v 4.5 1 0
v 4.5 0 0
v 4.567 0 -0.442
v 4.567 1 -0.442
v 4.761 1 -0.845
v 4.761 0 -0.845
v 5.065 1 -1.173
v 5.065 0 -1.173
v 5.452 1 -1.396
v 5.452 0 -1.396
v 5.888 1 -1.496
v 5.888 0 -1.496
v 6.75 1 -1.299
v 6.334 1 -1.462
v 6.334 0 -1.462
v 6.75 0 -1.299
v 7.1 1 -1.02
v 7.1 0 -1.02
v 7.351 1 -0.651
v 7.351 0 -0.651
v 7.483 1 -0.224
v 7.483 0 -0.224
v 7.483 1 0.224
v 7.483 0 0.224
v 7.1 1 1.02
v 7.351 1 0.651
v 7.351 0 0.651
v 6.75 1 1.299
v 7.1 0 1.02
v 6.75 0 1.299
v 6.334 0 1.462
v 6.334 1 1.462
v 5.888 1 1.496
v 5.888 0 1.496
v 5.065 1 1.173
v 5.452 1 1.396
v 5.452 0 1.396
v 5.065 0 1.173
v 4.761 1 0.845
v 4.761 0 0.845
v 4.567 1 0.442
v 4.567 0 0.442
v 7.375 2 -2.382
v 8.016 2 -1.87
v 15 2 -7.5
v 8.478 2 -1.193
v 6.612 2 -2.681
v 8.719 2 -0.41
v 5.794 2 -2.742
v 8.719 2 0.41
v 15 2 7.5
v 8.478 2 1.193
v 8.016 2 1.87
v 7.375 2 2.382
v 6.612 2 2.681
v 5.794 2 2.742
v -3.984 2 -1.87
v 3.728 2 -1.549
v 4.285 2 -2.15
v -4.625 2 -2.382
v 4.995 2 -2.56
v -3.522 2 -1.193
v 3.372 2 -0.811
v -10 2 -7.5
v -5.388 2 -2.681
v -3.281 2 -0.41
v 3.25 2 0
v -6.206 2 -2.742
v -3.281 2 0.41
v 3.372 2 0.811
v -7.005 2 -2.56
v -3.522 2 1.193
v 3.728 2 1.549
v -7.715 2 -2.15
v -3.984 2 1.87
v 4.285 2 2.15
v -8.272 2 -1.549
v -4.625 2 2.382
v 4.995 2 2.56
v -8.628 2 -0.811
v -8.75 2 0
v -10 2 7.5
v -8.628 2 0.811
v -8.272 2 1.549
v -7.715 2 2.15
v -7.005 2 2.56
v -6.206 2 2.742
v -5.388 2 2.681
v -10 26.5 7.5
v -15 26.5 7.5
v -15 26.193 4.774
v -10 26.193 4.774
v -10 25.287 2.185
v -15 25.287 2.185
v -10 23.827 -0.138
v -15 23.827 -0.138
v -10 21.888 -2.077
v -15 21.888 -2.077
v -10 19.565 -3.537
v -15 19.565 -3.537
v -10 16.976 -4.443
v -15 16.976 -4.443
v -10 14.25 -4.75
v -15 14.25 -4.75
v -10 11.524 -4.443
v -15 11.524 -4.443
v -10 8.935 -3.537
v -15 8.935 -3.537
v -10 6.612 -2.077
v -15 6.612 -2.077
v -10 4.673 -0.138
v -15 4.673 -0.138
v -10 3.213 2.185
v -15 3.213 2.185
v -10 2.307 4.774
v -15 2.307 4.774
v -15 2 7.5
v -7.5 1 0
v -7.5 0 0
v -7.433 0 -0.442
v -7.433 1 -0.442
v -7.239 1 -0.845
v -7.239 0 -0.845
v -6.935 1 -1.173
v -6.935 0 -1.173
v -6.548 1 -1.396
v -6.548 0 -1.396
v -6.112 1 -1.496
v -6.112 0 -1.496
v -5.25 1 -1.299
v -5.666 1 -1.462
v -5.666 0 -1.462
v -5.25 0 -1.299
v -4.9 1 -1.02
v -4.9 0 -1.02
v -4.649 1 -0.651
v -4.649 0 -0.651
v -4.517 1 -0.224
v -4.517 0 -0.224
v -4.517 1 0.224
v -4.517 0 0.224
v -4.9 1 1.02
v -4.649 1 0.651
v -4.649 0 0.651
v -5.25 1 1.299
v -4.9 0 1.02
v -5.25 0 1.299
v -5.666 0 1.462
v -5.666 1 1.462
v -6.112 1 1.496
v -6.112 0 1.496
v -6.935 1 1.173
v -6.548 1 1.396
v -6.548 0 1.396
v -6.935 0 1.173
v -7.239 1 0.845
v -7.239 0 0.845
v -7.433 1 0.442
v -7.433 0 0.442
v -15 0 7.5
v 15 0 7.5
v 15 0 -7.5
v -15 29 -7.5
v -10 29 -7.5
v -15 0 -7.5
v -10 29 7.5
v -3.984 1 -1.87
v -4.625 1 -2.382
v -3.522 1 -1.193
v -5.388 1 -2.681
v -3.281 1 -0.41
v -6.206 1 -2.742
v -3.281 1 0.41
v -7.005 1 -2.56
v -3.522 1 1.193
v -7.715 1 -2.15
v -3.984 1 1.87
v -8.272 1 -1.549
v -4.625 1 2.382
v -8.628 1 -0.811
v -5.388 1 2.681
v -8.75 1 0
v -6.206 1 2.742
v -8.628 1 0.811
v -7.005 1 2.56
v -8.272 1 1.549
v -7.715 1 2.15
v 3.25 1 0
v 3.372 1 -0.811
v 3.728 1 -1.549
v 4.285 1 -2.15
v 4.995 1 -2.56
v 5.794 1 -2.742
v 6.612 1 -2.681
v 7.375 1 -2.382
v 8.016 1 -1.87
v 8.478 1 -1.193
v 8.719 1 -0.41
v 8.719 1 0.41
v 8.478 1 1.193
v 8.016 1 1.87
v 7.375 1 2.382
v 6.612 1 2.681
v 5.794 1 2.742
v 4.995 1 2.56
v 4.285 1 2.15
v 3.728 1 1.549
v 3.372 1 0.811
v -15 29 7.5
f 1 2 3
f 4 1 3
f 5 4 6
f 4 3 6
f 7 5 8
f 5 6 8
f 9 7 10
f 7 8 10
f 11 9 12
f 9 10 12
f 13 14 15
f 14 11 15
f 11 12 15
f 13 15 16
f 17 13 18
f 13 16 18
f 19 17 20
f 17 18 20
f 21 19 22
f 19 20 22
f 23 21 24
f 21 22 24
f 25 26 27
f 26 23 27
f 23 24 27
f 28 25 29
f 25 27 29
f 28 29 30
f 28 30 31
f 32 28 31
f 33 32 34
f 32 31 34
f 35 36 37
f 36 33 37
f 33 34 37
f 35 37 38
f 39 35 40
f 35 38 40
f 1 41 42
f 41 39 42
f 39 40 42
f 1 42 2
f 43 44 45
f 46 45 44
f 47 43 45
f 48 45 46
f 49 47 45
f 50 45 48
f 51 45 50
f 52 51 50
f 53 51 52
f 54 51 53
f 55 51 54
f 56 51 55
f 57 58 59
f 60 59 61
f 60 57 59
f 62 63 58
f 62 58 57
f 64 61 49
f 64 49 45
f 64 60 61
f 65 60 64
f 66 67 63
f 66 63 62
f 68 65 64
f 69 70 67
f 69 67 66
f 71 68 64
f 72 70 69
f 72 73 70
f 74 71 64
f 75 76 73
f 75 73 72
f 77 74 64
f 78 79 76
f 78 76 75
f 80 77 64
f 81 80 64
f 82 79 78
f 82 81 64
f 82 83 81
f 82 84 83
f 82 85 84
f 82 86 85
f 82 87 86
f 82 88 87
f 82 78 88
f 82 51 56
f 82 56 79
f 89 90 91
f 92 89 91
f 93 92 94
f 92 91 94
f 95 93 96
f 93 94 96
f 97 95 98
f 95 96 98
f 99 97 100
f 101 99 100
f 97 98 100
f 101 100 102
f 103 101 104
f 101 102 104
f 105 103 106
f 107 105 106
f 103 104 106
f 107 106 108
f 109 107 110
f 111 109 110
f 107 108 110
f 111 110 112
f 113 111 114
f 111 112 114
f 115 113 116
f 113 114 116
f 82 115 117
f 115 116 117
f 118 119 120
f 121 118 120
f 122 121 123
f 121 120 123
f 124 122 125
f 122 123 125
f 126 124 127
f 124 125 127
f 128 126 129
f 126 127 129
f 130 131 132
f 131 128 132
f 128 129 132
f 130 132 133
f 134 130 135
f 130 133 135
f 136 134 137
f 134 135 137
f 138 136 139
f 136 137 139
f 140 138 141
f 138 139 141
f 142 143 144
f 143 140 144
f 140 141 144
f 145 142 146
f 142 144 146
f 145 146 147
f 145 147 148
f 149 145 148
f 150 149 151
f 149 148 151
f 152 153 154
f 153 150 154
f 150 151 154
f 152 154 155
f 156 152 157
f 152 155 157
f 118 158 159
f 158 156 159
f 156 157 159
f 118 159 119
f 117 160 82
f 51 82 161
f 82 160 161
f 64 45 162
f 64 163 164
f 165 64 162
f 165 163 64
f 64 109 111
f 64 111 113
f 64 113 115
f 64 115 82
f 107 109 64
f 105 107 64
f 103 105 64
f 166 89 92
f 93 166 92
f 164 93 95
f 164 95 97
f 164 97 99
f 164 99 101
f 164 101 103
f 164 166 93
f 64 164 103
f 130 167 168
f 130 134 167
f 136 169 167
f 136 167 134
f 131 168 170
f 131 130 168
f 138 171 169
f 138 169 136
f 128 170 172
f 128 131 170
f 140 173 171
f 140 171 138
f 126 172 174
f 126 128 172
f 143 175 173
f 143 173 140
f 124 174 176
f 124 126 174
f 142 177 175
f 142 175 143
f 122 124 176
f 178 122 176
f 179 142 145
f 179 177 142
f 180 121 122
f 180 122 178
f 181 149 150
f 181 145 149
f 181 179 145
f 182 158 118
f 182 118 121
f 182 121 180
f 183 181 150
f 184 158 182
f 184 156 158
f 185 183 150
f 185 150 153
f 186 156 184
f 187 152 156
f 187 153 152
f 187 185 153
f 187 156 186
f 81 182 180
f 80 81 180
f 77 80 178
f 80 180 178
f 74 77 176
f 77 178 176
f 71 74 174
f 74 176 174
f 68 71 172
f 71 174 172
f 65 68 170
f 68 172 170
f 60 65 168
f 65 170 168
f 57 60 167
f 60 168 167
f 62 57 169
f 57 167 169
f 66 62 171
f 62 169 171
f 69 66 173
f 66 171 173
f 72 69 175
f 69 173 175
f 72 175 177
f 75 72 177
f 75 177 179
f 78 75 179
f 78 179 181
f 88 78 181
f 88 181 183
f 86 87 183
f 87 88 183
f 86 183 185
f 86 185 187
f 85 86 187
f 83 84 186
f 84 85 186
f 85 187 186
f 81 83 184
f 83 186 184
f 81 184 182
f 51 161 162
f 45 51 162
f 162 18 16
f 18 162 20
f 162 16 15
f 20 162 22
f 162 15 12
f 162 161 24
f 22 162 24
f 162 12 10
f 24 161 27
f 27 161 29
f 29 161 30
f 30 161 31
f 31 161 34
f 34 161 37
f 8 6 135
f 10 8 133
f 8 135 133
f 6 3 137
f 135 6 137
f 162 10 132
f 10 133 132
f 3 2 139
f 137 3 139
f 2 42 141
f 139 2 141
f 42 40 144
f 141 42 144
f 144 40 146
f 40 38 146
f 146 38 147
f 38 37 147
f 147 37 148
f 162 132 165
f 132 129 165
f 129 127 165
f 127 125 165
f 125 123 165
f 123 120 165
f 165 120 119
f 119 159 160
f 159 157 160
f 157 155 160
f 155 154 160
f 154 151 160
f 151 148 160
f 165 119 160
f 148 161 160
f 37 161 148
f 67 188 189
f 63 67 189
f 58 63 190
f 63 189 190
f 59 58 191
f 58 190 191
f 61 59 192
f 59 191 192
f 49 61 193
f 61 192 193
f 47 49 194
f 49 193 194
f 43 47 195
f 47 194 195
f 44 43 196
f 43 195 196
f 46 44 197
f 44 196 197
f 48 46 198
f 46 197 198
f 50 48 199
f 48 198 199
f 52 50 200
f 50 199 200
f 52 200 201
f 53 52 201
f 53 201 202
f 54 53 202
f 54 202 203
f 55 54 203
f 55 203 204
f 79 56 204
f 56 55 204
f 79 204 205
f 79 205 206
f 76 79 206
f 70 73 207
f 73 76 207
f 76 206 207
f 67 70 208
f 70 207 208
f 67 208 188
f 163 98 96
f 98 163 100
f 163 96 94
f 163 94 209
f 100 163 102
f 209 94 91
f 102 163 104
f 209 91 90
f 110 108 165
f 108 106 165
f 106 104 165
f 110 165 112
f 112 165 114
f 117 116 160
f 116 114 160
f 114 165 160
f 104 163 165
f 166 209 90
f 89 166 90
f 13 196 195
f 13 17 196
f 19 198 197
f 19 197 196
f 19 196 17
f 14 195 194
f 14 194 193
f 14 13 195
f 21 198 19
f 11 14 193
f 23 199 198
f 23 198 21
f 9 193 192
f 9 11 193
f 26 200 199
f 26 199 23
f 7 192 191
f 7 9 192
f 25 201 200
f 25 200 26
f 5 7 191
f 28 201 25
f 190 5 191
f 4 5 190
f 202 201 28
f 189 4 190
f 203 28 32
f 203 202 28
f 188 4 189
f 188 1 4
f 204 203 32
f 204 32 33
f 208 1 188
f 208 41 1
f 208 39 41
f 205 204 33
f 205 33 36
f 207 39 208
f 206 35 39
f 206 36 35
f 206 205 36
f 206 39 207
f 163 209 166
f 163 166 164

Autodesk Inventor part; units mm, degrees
ref_plane "YZ Plane" through (0, 0, 0) normal (1, 0, 0) x (0, 1, 0)
ref_plane "XZ Plane" through (0, 0, 0) normal (0, 1, 0) x (-1, 0, 0)
ref_plane "XY Plane" through (0, 0, 0) normal (0, 0, 1) x (1, 0, 0)
sketch "Sketch1" plane through (0, 0, 0) normal (0, 1, 0) x (-1, 0, 0)
  line L0 (15, 7.5) -> (-15, 7.5)
  line L1 (-15, 7.5) -> (-15, -7.5)
  line L2 (-15, -7.5) -> (15, -7.5)
  line L3 (15, -7.5) -> (15, 7.5)
  line L4 (15, 7.5) -> (-15, -7.5) construction
  line L5 (-15, 7.5) -> (15, -7.5) construction
  line L6 (15, 7.5) -> (13, 7.5)
  line L7 (13, 7.5) -> (13, -7.5)
  line L8 (13, -7.5) -> (15, -7.5)
  line L9 (15, -7.5) -> (15, 7.5)
  circle A0 centre (6, 0) radius 1.5
  circle A1 centre (6, 0) radius 2.75
  line L10 (0, 7.5) -> (0, -7.5) construction
  circle A2 centre (-6, 0) radius 1.5
  circle A3 centre (-6, 0) radius 2.75
  point P0 (0, 0)
  dimension "d0" = 30
  dimension "d1" = 15
  dimension "d2" = 2
  dimension "d3" = 3
  dimension "d4" = 5.5
  dimension "d5" = 6
extrude "Extrusion1" add sketch "Sketch1" along normal blind 2 contours L7 L2 L1 L0
extrude "Extrusion2" add sketch "Sketch1" along normal blind 1 contours A1 | A3
extrude "Extrusion3" add sketch "Sketch1" along normal blind 29 contours L3 L2 L7 L0
sketch "Sketch2" plane through (-13, 2, -7.5) normal (1, 0, 0) x (0, 0, -1)
  line L0 (-15, 0) -> (-15, 27) projected
  circle A0 centre (-15, 12.25) radius 12.25
  line L1 (-15, 0) -> (0, 0) projected
  point P0 (-7.5, -2)
  point P1 (-15, 24.5)
  dimension "d15" = 24.5
  dimension "d16" = 12.25
extrude "Extrusion4" cut sketch "Sketch2" against normal blind 30 contours L0 A0 picked at (-11.8075, 14.7959)
sketch "Sketch3" plane through (-13, 2, -7.5) normal (1, 0, 0) x (0, 0, -1)
  line L0 (-15, 27) -> (0, 27) projected
  line L1 (-15, 27) -> (0, 27)
  line L2 (0, -2) -> (0, 0) projected
  line L3 (0, 27) -> (0, 0)
  line L4 (0, 0) -> (-15, 0) projected
  line L5 (0, 0) -> (-15, 0)
  arc A0 (-15, 0) -> (-15, 24.5) centre (-15, 12.25) ccw projected
  arc A1 (-15, 24.5) -> (-2.75, 12.25) centre (-15, 12.25) ccw
  line L6 (-15, 27) -> (-15, 24.5)
  line L7 (-15, 0) -> (-15, 24.5)
  point P0 (-7.5, -2)
extrude "Extrusion5" add sketch "Sketch3" along normal blind 3 contours L0 L3 L4 A0 L6
properties part number "Bracket Motor JGA Kanan_3DPrint"
